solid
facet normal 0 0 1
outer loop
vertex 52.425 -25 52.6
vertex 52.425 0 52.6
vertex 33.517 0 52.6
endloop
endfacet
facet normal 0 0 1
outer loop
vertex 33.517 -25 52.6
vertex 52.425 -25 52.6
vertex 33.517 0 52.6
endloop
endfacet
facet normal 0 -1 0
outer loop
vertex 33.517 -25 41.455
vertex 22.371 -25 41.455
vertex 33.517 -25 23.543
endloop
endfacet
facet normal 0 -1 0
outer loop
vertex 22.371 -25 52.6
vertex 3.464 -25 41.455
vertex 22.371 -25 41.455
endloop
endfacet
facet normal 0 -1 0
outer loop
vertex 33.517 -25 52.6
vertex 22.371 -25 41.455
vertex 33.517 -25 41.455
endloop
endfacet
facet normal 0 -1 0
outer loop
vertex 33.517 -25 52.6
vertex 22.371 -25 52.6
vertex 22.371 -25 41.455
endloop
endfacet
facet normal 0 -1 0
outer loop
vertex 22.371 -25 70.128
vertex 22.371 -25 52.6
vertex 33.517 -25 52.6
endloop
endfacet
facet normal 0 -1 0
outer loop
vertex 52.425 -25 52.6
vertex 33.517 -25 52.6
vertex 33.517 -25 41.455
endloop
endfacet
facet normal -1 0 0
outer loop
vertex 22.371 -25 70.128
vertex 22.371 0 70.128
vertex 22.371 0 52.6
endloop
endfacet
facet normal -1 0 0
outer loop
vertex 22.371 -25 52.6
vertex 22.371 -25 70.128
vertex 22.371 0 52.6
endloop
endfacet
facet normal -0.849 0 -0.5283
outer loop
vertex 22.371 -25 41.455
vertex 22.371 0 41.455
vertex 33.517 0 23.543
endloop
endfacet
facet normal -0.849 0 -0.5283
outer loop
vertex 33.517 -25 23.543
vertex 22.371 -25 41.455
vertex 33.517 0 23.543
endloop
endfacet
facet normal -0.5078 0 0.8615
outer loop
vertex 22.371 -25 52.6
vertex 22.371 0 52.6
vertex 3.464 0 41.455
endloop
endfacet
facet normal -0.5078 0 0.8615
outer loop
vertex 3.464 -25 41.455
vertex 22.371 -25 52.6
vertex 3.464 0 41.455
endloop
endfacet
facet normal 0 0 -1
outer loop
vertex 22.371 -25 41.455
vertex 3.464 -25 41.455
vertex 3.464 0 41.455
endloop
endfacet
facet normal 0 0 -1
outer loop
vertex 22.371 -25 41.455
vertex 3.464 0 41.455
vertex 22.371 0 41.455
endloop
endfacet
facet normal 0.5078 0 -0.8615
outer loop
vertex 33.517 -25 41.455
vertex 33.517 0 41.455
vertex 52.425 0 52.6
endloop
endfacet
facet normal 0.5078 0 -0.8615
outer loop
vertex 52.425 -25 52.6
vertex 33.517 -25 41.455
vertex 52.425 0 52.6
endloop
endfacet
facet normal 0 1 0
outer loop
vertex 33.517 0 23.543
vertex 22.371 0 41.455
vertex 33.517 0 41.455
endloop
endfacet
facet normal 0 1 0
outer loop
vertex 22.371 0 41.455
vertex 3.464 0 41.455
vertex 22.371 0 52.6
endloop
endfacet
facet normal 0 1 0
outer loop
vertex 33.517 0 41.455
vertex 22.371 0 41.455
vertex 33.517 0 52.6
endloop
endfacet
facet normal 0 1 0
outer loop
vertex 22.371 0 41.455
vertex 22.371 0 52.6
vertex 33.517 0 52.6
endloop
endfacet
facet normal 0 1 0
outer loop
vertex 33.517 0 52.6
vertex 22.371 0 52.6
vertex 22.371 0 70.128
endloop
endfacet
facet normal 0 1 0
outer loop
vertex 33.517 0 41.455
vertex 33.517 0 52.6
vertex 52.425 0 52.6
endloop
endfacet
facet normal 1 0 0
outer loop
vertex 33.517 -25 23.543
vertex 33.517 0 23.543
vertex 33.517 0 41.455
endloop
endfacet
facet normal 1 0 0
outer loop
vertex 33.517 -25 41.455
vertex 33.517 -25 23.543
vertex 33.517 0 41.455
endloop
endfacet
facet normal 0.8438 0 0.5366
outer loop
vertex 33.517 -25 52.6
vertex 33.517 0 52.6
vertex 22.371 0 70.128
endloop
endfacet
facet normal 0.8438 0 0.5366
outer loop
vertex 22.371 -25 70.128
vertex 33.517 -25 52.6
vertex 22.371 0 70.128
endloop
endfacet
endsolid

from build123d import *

# Parameters (mm, degrees)
F0_W     = 11.1455010677
F0_H     = 11.1455010677
F1_DEPTH = 25


with BuildPart() as f1:
    # F0 (on Front) → F1 (new body)
    with BuildSketch(Plane.XZ):
        Polygon((3.4639391611, 41.4549691979), (22.3714864994, 41.4549691979), (22.3714864994, 52.6004702657), align=None)
        with Locations((27.9442370333, 47.0277197318)):
            Rectangle(F0_W, F0_H)
        Polygon((33.5169875672, 23.542555845), (33.5169875672, 41.4549691979), (22.3714864994, 41.4549691979), align=None)
        Polygon((33.5169875672, 52.6004702657), (33.5169875672, 41.4549691979), (52.4245357128, 52.6004702657), align=None)
        Polygon((22.3714864994, 52.6004702657), (33.5169875672, 52.6004702657), (22.3714864994, 70.1275136257), align=None)
    extrude(amount=F1_DEPTH)


solid = f1.part
